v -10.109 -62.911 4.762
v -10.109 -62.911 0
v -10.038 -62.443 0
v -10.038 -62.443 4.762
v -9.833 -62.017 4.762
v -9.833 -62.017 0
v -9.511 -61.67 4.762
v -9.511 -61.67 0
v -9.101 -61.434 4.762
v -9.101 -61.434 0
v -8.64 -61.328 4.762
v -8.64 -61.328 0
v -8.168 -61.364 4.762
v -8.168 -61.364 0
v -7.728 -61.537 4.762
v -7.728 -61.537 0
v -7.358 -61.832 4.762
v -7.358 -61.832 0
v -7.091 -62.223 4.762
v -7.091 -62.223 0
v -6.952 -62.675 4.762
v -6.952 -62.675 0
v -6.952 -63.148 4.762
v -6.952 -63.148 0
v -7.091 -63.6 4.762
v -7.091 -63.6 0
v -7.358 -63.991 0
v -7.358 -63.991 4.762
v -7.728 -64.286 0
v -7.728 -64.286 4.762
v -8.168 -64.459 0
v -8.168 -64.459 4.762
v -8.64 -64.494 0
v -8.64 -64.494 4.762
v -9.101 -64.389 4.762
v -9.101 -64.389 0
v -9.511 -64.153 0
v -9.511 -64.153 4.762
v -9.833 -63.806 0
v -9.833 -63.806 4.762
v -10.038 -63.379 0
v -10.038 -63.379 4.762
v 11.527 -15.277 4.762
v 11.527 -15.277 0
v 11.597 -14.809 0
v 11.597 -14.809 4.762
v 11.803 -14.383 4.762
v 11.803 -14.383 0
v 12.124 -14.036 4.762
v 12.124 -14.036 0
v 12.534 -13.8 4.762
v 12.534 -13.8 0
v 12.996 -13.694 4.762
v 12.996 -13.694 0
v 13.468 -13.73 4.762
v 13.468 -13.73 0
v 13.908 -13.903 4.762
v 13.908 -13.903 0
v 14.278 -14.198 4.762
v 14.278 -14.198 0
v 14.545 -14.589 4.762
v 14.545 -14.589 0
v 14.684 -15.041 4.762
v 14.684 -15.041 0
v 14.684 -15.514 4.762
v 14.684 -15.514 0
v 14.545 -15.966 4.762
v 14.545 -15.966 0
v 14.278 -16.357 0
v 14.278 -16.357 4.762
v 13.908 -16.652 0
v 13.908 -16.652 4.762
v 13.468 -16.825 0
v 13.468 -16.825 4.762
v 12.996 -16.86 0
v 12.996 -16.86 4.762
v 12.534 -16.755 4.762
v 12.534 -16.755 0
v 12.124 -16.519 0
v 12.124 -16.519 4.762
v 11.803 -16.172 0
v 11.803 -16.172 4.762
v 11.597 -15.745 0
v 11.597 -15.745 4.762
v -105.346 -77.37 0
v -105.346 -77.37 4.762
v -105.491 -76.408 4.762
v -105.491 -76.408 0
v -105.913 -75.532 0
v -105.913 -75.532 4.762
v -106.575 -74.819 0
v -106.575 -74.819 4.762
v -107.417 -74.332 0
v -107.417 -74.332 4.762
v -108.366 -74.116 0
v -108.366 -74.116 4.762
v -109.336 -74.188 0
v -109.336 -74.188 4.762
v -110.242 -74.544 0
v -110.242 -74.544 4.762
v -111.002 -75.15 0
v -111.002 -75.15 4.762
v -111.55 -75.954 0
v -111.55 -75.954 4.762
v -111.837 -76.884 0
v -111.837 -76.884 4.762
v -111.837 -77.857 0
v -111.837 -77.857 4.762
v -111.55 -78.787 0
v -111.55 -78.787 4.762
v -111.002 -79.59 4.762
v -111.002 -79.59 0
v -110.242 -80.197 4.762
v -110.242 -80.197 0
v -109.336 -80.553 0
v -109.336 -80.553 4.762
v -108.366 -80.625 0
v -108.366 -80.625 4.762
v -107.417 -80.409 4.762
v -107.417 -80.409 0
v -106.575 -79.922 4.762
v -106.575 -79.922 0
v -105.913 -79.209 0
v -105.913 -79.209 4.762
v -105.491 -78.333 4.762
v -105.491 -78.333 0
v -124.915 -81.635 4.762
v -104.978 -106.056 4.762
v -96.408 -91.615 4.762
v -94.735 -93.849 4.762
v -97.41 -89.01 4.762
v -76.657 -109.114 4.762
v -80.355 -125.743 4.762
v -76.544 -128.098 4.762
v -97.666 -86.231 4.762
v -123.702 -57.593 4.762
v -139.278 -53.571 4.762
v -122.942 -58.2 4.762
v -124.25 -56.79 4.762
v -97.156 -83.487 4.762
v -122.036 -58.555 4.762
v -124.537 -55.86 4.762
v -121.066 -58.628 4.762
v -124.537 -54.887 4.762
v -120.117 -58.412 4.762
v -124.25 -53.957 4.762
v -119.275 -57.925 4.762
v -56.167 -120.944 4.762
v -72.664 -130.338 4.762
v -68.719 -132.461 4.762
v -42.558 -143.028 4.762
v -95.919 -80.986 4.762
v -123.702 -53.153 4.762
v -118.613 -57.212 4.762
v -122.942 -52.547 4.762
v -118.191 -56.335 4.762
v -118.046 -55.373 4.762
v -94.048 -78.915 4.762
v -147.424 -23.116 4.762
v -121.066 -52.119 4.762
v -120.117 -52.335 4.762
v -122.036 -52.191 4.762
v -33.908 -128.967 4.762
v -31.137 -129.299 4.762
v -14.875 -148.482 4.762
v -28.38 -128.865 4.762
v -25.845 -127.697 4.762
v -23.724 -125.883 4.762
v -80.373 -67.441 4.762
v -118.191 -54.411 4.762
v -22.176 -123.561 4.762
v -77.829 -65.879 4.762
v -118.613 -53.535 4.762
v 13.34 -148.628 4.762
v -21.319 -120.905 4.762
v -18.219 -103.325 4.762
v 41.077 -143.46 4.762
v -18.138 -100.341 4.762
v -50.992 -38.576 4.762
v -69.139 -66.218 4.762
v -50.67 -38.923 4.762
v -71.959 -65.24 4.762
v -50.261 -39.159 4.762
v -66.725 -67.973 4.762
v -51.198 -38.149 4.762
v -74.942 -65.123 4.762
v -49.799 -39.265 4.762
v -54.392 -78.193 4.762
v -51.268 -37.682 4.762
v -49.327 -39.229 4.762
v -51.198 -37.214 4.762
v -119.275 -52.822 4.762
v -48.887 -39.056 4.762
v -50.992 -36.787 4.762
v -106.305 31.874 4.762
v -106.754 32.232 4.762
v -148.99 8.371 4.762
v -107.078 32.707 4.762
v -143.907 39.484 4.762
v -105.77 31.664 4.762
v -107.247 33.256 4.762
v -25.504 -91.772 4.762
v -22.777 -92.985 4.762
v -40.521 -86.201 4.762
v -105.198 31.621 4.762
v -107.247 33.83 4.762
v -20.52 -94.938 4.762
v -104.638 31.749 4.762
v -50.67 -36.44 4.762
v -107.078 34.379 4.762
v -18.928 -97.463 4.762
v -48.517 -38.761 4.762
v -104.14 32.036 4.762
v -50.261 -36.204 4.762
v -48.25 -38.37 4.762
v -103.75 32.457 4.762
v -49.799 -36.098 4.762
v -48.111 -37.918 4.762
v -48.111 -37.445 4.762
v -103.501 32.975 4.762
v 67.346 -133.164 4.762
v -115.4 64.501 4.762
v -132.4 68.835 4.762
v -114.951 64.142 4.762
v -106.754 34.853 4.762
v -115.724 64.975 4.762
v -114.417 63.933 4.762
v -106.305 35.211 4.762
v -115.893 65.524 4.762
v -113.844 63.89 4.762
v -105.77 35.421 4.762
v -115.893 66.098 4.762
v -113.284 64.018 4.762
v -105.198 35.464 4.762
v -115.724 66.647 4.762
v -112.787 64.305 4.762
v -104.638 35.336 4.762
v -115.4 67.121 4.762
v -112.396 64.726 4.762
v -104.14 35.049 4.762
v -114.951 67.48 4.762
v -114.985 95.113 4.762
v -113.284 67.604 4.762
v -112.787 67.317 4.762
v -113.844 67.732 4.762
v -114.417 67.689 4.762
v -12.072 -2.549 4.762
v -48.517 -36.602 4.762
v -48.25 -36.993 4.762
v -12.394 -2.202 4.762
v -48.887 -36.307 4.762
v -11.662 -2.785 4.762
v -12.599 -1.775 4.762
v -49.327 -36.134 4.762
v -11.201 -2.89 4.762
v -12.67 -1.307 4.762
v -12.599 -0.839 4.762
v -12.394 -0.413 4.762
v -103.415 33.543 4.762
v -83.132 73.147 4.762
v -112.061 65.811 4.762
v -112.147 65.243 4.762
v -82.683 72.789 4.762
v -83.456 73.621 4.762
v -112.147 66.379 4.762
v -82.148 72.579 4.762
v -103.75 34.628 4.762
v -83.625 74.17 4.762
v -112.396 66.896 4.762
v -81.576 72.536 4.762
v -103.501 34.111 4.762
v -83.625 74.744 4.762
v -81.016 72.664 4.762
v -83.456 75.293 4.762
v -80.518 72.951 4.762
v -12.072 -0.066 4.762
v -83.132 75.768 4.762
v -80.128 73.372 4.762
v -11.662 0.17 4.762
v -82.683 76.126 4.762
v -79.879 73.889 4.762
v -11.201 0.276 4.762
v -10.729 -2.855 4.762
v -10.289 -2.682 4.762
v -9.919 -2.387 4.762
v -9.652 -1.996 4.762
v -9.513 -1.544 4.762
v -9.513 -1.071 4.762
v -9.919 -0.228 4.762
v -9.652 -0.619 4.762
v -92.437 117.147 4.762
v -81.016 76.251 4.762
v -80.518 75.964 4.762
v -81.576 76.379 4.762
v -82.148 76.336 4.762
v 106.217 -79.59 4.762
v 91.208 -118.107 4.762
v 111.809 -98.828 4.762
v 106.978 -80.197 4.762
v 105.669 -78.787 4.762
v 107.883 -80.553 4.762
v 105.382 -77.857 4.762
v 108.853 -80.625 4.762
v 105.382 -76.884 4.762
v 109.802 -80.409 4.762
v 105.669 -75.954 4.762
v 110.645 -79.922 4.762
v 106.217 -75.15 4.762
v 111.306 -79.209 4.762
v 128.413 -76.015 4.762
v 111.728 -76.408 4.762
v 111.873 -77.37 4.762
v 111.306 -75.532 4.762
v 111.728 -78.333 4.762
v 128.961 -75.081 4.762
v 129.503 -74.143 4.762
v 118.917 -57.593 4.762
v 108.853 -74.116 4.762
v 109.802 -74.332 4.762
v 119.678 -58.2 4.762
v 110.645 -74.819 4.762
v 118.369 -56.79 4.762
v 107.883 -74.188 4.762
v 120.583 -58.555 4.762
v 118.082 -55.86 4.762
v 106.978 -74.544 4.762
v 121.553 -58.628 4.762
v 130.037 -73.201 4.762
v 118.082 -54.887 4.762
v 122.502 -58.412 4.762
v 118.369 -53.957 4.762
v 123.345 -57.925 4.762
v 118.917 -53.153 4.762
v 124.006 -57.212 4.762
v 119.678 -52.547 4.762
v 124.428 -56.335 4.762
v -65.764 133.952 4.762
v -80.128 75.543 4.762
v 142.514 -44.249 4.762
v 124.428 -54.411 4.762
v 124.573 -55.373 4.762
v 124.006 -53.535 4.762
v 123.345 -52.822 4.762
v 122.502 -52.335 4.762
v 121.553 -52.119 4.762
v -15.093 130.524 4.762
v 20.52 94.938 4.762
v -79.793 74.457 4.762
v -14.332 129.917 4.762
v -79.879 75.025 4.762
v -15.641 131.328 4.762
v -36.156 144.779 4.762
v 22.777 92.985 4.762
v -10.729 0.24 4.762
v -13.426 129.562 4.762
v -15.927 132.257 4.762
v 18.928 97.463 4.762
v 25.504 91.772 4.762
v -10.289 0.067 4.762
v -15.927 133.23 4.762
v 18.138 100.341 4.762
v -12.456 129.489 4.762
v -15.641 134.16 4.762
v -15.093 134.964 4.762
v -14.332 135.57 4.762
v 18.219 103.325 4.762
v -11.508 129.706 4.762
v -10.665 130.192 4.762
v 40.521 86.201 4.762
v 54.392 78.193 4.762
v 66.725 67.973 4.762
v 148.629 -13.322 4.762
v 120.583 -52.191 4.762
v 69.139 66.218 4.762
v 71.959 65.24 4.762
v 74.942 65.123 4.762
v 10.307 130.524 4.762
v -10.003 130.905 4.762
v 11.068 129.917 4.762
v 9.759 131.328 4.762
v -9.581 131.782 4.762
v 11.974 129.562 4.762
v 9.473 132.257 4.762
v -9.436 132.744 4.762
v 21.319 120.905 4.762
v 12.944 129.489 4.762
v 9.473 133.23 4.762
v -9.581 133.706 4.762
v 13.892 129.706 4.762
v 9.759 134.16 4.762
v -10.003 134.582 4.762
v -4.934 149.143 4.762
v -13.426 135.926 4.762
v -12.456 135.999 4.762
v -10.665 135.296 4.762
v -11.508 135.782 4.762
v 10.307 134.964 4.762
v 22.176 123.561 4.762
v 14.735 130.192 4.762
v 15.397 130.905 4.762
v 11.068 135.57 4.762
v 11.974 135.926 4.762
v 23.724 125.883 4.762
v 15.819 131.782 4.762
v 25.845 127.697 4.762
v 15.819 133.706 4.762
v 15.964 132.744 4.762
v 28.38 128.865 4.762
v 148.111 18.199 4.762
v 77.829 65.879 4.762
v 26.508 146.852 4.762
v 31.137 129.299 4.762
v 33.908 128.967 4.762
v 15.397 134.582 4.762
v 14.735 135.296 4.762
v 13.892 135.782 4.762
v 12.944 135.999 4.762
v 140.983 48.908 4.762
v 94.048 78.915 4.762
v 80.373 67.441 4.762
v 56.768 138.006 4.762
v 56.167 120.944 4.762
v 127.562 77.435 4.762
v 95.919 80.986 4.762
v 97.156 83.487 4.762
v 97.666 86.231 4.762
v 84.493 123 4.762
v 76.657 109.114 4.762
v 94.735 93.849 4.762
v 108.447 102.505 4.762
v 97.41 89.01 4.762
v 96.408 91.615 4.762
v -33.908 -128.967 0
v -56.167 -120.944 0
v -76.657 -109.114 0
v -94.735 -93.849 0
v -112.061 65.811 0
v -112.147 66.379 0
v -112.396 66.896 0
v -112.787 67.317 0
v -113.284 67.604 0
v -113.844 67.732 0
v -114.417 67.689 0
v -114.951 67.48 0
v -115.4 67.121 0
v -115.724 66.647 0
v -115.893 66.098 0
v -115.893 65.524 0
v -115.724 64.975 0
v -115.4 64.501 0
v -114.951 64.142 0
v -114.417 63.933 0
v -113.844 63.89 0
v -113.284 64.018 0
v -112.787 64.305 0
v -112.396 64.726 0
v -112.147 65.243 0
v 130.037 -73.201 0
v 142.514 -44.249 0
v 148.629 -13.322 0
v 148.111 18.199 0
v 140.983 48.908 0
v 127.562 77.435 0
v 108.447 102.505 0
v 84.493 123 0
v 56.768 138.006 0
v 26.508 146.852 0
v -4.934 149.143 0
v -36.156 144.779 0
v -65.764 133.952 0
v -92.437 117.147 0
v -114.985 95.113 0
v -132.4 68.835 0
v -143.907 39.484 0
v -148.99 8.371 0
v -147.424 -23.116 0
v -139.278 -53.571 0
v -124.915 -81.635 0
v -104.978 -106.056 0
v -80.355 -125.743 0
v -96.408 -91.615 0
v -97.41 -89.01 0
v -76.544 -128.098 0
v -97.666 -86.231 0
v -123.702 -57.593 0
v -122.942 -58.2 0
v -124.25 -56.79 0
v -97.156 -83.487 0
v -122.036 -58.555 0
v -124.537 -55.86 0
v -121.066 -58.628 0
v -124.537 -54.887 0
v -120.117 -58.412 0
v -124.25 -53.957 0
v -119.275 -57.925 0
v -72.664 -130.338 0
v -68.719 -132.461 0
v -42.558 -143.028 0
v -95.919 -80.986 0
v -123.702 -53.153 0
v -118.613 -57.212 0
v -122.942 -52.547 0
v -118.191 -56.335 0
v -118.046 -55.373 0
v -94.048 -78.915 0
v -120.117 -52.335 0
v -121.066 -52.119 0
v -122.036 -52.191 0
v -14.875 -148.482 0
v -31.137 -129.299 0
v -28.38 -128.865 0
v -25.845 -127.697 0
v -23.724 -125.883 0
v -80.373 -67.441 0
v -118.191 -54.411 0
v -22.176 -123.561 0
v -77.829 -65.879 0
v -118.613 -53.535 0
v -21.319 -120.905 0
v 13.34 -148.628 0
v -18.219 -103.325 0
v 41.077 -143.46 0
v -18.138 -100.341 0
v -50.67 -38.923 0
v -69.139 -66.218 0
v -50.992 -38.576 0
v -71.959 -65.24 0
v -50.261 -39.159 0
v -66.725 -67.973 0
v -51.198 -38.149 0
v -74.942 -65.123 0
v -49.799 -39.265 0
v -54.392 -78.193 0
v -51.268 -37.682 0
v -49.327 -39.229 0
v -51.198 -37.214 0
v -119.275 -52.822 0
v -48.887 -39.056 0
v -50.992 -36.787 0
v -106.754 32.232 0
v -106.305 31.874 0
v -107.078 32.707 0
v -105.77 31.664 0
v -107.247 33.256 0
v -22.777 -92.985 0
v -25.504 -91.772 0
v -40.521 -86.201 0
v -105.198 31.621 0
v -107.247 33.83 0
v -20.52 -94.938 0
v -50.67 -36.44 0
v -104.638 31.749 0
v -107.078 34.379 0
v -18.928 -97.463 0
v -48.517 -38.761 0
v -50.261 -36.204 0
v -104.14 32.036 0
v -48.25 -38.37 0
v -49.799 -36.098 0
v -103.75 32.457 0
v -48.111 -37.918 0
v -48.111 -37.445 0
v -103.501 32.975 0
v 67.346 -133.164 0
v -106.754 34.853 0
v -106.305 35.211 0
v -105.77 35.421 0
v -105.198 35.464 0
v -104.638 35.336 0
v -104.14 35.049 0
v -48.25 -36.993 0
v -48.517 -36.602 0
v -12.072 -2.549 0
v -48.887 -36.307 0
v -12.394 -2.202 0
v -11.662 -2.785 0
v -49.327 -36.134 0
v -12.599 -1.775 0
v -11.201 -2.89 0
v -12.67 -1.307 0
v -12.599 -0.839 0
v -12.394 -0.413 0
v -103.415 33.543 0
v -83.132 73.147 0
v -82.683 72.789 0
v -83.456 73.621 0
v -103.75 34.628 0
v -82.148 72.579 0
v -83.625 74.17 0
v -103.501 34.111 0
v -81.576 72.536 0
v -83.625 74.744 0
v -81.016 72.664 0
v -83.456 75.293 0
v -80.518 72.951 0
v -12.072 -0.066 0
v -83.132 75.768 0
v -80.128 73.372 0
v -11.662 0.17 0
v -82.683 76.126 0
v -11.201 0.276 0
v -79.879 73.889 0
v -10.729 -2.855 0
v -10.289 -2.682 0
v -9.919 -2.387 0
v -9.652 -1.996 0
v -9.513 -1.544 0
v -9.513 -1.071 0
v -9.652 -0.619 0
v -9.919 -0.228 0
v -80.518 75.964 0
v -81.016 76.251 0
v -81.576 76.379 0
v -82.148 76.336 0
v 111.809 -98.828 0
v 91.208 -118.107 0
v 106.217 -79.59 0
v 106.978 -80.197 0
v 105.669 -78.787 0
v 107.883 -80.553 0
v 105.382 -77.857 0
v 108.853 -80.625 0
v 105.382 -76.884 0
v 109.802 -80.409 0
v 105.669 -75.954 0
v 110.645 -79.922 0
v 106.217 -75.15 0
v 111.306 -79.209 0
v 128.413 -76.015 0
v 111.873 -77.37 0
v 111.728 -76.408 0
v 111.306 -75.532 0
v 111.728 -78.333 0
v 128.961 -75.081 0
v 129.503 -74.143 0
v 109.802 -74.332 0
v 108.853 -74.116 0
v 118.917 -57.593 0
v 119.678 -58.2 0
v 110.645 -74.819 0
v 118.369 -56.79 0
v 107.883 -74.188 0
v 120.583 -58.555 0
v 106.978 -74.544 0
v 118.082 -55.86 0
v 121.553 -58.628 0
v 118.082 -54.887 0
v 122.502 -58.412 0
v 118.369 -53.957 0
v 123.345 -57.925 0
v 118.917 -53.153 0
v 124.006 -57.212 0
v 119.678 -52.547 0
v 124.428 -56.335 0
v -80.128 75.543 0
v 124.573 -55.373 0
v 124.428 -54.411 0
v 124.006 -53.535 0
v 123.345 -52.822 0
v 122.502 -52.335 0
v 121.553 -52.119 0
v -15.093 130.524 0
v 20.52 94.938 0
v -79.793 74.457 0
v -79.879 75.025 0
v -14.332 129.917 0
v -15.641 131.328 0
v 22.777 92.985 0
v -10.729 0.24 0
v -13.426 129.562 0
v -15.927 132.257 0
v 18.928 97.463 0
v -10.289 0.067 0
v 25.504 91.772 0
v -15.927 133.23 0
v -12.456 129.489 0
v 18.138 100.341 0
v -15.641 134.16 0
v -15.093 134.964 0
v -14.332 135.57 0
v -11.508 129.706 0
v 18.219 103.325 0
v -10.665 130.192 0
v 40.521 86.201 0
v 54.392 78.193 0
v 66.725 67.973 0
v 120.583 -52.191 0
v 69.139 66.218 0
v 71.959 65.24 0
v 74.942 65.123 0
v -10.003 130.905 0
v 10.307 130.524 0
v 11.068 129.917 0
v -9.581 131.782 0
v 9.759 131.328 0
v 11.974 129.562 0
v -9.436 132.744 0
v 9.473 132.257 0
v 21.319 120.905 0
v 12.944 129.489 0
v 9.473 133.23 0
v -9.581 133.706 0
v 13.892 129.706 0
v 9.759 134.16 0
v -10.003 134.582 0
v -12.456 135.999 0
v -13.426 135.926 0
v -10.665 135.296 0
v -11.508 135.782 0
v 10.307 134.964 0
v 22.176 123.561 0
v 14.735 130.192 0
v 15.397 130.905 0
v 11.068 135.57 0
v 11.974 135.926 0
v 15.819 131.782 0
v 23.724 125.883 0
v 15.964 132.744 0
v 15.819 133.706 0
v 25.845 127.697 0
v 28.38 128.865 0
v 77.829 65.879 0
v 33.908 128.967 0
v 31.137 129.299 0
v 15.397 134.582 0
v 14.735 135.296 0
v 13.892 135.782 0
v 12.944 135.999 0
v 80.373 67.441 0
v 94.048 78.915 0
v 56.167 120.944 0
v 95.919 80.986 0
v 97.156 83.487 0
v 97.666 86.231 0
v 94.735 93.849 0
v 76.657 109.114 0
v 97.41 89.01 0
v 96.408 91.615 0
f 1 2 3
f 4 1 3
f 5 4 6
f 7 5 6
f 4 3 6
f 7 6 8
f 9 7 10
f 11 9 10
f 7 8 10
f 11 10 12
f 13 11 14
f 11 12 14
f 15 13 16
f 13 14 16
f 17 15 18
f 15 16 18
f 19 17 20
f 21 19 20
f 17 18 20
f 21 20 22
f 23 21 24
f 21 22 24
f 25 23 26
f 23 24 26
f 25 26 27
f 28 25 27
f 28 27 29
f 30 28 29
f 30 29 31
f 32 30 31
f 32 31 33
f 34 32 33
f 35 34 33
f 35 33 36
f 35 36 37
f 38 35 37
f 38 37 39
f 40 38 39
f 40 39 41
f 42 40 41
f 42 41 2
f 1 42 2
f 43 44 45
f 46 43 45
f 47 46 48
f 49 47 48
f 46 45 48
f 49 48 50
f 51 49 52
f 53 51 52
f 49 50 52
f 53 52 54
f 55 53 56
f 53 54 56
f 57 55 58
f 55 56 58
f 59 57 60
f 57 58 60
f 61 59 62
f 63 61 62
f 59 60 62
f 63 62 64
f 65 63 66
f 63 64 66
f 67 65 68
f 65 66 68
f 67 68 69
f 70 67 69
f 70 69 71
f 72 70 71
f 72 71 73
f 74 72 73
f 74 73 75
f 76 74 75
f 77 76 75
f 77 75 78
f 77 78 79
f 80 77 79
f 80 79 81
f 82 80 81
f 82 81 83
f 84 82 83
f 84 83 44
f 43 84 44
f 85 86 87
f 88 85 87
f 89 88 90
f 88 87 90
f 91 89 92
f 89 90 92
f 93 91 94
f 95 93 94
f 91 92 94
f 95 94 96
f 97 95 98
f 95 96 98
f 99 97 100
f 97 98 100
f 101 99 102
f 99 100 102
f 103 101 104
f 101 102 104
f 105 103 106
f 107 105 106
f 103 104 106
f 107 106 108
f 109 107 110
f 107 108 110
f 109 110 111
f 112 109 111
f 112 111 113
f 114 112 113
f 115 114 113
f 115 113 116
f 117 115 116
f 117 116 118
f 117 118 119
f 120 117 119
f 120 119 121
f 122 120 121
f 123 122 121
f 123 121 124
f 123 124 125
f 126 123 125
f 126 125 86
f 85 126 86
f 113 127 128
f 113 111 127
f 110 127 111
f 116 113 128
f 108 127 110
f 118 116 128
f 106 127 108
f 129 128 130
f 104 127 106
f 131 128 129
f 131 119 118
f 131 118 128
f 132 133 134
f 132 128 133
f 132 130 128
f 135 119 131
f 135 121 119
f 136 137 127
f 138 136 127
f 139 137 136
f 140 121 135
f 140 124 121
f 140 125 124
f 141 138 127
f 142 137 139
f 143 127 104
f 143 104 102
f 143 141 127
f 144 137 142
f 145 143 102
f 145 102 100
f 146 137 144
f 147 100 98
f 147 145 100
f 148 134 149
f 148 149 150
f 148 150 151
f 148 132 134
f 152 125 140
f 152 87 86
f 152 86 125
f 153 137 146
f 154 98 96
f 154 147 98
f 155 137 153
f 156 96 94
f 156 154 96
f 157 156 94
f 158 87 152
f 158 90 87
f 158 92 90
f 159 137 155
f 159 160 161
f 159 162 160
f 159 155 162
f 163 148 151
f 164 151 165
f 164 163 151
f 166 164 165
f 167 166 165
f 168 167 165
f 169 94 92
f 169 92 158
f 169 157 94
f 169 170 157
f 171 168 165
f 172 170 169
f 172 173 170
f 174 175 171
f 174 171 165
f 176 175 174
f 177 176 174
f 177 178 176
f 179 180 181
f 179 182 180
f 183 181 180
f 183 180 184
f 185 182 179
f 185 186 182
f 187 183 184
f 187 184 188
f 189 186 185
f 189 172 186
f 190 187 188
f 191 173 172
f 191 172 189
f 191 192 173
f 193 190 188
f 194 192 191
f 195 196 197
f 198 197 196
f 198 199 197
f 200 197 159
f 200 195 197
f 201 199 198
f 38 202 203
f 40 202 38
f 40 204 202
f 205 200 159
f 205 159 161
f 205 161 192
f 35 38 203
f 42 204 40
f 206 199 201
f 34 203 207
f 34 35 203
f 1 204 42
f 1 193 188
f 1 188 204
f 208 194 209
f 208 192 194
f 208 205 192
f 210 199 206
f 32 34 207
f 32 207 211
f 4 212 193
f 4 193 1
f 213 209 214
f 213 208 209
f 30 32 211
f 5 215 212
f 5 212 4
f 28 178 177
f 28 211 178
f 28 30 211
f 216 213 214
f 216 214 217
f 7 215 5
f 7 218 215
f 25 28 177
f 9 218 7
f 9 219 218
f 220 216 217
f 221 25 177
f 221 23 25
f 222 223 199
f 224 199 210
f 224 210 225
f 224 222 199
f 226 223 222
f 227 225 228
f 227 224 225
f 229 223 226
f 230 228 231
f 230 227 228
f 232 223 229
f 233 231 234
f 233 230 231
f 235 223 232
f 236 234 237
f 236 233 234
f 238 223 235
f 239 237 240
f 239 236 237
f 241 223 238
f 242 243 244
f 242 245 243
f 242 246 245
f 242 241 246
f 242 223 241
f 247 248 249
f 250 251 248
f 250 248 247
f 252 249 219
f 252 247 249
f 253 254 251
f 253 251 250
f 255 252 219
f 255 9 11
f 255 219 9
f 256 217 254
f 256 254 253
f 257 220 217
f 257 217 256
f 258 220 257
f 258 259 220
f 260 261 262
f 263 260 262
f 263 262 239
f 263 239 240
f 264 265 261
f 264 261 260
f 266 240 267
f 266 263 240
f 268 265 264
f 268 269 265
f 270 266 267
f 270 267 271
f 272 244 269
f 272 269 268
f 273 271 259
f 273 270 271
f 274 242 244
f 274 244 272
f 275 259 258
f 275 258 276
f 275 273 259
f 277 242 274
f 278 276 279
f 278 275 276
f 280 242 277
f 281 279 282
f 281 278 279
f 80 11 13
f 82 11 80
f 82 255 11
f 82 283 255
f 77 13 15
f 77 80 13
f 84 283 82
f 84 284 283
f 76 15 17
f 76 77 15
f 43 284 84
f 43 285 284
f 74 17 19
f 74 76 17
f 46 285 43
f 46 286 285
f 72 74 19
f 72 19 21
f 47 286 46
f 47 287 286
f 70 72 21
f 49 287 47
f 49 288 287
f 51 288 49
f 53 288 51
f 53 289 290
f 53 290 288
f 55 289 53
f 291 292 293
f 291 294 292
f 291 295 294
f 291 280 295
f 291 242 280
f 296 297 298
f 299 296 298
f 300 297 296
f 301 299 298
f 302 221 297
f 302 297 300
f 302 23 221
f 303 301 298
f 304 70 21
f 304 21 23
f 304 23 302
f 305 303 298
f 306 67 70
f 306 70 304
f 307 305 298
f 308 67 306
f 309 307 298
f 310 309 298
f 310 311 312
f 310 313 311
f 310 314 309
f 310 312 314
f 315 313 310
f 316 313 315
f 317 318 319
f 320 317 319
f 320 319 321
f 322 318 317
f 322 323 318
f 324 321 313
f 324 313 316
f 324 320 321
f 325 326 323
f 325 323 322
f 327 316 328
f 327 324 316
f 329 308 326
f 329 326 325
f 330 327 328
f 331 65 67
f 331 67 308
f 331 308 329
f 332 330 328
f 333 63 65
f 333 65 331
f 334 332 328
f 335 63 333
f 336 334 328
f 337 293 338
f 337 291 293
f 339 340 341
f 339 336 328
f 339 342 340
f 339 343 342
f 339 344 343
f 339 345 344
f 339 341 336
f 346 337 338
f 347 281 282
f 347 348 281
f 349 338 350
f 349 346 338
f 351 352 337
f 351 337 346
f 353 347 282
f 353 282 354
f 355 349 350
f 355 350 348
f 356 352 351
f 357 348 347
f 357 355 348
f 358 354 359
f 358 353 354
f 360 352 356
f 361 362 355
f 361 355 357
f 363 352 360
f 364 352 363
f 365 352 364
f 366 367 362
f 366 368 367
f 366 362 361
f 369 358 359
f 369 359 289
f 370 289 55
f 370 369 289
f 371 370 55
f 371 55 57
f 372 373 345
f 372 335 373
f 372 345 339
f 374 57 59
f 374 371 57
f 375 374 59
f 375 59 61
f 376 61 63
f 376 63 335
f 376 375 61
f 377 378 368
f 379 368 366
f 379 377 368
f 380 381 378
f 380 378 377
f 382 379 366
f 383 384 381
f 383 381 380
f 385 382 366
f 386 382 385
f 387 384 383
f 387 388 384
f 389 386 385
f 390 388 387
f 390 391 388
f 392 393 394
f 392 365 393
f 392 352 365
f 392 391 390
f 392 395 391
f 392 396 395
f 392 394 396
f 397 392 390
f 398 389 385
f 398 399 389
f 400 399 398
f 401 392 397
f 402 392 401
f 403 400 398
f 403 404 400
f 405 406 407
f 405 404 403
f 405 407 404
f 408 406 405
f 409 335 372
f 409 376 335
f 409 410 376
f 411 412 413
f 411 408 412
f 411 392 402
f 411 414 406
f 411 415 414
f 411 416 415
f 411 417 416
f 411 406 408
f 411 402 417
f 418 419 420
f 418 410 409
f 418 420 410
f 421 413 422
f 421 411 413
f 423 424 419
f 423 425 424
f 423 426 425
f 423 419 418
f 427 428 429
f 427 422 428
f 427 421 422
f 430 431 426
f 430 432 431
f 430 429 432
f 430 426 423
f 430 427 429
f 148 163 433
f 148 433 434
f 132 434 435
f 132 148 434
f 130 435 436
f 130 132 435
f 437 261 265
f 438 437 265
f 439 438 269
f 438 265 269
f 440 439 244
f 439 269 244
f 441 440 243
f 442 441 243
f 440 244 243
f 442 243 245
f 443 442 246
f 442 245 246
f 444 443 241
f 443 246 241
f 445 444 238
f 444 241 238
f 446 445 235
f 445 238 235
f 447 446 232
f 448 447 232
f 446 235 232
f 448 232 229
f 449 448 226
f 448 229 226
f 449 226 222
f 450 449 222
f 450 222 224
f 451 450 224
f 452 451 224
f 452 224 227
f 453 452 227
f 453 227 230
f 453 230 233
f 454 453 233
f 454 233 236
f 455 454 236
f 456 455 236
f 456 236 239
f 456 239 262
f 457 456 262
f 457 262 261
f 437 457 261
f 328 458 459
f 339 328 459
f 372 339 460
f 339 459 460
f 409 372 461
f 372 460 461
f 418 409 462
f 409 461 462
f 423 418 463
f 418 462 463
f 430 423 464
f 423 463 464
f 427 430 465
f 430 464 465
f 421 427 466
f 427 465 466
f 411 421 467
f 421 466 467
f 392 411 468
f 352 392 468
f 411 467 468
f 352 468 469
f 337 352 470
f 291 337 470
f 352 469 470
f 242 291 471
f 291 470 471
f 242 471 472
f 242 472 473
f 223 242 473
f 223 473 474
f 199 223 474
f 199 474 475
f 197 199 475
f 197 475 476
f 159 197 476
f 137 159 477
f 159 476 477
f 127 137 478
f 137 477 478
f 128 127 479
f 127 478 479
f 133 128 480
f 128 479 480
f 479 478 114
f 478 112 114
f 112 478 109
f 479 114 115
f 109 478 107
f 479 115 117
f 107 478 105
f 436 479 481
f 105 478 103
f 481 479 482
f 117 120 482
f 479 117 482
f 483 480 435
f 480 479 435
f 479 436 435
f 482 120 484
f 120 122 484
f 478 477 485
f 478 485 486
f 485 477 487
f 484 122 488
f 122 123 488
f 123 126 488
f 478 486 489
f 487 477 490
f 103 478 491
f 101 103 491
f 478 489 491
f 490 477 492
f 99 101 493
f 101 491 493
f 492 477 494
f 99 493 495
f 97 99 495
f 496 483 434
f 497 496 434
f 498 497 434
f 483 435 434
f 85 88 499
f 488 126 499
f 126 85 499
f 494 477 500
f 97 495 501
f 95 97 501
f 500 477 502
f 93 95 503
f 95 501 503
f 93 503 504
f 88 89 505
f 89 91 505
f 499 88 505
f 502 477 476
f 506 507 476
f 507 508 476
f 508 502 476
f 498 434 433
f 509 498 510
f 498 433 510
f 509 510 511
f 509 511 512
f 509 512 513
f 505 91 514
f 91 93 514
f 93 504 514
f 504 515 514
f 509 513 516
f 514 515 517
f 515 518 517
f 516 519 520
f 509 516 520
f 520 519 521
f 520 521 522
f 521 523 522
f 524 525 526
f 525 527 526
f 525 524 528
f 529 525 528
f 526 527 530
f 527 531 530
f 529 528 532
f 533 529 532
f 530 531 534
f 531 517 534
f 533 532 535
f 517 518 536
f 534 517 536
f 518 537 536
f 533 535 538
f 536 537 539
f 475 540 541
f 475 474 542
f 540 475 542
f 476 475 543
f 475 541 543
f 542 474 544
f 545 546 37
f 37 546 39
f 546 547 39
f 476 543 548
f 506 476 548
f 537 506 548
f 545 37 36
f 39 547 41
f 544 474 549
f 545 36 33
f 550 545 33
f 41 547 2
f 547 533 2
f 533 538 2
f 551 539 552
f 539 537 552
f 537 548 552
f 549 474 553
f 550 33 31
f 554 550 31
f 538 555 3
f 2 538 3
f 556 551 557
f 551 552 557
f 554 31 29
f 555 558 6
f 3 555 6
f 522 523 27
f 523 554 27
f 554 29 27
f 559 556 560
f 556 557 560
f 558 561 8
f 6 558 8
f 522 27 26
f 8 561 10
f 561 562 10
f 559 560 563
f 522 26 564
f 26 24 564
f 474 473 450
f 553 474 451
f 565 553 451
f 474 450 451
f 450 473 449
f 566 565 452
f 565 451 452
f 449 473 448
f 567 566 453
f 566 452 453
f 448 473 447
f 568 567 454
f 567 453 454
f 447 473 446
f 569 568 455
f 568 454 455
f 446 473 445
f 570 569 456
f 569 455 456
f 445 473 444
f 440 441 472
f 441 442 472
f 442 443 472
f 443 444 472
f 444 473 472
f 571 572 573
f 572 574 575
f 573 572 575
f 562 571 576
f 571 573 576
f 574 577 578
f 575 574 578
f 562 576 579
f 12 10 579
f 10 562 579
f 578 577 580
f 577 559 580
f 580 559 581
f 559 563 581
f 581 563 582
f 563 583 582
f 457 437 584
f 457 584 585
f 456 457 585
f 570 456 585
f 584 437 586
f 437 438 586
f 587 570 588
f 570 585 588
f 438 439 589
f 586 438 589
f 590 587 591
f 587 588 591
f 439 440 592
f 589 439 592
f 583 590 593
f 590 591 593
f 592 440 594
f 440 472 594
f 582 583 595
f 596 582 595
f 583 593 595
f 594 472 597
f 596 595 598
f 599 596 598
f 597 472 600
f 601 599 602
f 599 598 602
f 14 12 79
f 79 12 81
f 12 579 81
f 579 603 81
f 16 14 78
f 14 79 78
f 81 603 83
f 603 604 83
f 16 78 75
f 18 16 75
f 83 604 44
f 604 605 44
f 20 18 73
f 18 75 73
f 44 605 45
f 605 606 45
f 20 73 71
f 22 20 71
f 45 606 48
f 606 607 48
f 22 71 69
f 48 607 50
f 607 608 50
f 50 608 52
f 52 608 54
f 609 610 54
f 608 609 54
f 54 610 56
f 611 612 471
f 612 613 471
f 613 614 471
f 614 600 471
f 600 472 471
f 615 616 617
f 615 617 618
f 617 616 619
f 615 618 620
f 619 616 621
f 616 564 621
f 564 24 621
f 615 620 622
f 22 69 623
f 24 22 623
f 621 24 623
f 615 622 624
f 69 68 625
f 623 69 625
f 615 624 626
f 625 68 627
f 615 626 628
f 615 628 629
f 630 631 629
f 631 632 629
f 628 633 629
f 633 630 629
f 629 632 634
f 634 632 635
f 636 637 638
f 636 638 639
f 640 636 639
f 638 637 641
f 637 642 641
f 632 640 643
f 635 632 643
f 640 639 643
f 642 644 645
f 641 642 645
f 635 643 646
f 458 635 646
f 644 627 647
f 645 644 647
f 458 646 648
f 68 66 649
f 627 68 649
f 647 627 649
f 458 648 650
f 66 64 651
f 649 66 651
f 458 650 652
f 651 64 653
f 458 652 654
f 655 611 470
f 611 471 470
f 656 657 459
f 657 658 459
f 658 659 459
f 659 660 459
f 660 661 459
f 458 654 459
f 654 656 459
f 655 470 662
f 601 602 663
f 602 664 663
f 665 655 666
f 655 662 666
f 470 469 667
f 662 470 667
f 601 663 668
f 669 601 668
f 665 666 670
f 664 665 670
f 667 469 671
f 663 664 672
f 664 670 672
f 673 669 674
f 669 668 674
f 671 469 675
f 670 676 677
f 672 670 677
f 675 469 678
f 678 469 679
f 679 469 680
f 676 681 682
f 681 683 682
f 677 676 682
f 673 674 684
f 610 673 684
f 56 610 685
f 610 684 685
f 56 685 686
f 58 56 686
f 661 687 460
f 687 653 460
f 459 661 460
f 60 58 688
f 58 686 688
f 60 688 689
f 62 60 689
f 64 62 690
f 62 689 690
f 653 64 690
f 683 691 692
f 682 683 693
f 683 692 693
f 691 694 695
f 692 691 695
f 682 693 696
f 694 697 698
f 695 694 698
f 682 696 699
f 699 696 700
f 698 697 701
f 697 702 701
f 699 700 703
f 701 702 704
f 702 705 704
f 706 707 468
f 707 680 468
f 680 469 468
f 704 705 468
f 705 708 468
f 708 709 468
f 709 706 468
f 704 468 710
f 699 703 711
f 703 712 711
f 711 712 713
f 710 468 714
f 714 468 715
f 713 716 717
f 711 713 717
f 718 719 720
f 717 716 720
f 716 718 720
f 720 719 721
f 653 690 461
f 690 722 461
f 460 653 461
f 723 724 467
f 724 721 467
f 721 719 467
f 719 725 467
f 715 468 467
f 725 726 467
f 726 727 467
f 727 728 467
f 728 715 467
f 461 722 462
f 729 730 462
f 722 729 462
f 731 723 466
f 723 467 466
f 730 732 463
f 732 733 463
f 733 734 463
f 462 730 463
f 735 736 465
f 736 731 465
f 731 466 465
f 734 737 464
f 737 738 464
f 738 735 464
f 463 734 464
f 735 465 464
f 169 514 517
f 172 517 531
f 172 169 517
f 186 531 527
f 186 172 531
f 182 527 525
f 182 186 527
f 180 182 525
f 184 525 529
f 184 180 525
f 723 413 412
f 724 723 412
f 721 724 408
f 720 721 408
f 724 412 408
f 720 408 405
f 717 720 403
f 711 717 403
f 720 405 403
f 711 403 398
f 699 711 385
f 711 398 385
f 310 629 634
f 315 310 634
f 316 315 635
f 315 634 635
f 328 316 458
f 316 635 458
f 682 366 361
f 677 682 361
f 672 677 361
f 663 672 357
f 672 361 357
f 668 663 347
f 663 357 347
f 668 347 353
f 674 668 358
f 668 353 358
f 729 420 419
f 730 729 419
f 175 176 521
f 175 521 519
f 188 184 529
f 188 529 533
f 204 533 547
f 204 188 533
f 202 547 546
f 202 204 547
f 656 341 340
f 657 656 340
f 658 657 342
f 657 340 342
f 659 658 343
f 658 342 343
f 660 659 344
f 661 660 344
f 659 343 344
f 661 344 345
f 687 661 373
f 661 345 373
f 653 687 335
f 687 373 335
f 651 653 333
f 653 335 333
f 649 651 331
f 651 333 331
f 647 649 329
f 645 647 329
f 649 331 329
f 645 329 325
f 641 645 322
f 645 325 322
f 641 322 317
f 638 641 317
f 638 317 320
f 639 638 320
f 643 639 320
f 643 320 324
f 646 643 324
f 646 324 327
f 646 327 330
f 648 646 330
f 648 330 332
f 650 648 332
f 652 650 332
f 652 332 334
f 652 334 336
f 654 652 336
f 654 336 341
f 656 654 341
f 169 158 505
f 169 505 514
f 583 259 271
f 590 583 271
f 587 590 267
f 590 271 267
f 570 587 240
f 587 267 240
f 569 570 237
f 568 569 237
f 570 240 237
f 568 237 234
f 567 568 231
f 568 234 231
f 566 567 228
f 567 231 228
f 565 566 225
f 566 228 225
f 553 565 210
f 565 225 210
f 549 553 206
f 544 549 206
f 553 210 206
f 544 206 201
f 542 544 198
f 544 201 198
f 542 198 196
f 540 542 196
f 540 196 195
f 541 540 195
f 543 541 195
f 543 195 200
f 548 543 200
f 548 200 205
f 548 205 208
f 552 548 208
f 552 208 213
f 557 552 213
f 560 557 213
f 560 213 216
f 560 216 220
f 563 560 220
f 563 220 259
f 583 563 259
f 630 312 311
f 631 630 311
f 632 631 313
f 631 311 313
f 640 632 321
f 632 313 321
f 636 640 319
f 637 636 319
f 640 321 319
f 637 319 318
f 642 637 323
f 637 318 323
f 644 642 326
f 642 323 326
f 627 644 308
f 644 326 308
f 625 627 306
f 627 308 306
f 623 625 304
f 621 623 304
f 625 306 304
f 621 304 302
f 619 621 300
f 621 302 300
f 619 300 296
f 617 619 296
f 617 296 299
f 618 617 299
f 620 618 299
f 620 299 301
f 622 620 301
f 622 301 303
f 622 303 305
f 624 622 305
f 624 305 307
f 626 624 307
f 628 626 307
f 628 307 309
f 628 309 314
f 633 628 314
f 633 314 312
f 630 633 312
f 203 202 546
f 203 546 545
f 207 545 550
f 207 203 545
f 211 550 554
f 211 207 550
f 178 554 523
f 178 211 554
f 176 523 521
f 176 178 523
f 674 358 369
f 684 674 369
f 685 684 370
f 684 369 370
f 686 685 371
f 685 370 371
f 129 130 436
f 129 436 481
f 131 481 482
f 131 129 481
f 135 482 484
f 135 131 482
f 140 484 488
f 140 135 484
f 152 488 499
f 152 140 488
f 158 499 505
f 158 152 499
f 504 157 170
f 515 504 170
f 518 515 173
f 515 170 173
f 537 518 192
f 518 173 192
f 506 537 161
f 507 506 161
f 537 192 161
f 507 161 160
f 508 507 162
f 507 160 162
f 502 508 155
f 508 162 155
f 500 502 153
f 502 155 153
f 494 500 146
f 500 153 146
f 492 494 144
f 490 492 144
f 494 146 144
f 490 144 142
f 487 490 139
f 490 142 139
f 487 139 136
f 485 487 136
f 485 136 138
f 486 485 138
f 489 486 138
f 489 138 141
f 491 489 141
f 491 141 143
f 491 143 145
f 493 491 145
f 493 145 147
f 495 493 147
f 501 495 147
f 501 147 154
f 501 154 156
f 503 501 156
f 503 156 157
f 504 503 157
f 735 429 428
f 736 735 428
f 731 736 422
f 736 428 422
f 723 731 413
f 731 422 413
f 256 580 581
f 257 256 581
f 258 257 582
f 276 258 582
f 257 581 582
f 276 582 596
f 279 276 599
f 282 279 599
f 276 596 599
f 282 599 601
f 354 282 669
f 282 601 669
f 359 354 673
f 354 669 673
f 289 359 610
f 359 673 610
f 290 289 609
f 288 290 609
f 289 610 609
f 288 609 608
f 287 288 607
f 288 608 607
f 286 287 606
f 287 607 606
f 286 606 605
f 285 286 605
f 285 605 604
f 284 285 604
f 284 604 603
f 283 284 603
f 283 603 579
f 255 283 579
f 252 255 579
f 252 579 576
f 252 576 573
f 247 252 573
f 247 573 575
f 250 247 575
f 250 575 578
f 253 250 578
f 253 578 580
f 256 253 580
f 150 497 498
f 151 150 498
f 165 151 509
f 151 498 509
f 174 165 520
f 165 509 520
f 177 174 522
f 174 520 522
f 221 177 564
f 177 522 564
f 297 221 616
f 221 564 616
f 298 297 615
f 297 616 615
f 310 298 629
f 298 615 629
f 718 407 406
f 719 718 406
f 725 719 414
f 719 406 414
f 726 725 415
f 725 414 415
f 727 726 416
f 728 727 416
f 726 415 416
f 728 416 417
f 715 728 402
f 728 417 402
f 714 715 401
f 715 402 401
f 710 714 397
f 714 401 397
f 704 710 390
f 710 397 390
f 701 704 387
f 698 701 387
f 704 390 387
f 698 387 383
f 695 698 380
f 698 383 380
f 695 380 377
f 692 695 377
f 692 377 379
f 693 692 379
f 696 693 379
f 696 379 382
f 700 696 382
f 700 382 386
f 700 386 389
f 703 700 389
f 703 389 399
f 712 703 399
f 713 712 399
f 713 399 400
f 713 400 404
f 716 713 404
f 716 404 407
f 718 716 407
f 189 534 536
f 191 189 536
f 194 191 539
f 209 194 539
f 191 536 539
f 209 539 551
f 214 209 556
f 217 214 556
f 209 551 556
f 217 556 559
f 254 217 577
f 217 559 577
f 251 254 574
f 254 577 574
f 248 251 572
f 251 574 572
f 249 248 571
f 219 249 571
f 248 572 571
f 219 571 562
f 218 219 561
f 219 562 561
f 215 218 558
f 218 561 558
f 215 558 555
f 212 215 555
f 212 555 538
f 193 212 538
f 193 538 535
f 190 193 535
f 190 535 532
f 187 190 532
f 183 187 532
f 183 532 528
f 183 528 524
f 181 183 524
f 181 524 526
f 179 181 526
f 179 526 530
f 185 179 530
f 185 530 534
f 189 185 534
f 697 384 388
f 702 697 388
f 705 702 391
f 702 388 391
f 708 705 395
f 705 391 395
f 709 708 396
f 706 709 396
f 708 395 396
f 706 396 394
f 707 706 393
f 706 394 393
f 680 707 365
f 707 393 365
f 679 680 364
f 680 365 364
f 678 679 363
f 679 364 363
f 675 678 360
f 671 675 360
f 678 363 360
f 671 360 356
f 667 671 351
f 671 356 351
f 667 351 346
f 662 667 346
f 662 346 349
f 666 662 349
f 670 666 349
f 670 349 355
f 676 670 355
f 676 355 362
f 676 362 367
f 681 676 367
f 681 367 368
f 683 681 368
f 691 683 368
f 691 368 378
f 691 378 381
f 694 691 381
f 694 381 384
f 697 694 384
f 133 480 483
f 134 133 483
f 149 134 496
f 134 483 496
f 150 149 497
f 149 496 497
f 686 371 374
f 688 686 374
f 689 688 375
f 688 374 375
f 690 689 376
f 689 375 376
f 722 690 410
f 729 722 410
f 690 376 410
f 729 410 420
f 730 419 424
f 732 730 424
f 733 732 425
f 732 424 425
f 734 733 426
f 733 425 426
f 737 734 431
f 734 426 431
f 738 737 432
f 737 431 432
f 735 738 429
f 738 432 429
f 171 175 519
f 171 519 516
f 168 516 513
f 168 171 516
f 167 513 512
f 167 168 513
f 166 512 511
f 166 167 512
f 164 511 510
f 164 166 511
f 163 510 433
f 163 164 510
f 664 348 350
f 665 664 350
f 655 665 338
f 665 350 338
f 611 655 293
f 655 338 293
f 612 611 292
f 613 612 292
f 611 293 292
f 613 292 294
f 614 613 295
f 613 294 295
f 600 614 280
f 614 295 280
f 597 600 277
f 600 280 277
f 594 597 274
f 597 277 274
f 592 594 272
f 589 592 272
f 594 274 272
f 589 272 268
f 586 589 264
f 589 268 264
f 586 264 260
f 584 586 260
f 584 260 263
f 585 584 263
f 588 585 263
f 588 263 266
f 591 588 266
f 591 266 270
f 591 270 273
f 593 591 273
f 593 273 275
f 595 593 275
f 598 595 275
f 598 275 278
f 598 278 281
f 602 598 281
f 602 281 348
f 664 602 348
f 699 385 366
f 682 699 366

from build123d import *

# Parameters (mm, degrees)
BOSS_EXTRUDE1_DEPTH          = 4.762
SKETCH5_R                    = 1.926649595
MOTOR_MOUNTING_HOLES_DEPTH   = 5.762
SKETCH7_R                    = 1.5875
ARDUINO_MOUNTING_HOLES_DEPTH = 5.762
SKETCH9_R                    = 3.2639
F_1_4_20_FEET_HOLES_DEPTH    = 5.762
HANDLES_DEPTH                = 5.762


with BuildPart() as part:
    # Sketch1 → Boss-Extrude1 (new body)
    with BuildSketch(Plane.XY):
        with BuildLine():
            ThreePointArc((-80.354757502, -125.742648182), (-74.6125, -129.23264088), (-68.718948913, -132.460585403))
            ThreePointArc((-68.718948913, -132.460585403), (41.077351206, -143.459931141), (128.412526716, -76.015285354))
            ThreePointArc((128.412526716, -76.015285354), (129.23264088, -74.6125), (130.03743155, -73.200867623))
            ThreePointArc((130.03743155, -73.200867623), (-36.155935906, 144.778620396), (-80.354757502, -125.742648182))
        make_face()
    extrude(amount=BOSS_EXTRUDE1_DEPTH)

    # Sketch5 → motor_mounting_holes (cut, through all)
    with BuildSketch(Plane.XY.offset(4.762)):
        with Locations((-81.719743632, 74.457252102)):
            Circle(SKETCH5_R)
        with Locations((-113.98799572, 65.811000014)):
            Circle(SKETCH5_R)
        with Locations((-105.341743632, 33.542747925)):
            Circle(SKETCH5_R)
    extrude(amount=-MOTOR_MOUNTING_HOLES_DEPTH, mode=Mode.SUBTRACT)

    # Sketch7 → arduino mounting holes (cut, through all)
    with BuildSketch(Plane(origin=(0, 0, 0), x_dir=(-1, 0, 0), z_dir=(0, 0, -1))):
        with Locations((-13.114276913, -15.277418882)):
            Circle(SKETCH7_R)
        with Locations((8.521314036, -62.911361657)):
            Circle(SKETCH7_R)
        with Locations((11.082472869, -1.307418882)):
            Circle(SKETCH7_R)
        with Locations((49.680700023, -37.681509395)):
            Circle(SKETCH7_R)
    extrude(amount=-ARDUINO_MOUNTING_HOLES_DEPTH, mode=Mode.SUBTRACT)

    # Sketch9 → 1/4-20 feet holes (cut, through all)
    with BuildSketch(Plane.XY.offset(4.762)):
        with Locations((121.309555388, -55.373407621)):
            Circle(SKETCH9_R)
        with Locations((108.609555388, -77.370452877)):
            Circle(SKETCH9_R)
        with Locations((-108.609555388, -77.370452877)):
            Circle(SKETCH9_R)
        with Locations((-121.309555388, -55.373407621)):
            Circle(SKETCH9_R)
        with Locations((-12.7, 132.743860498)):
            Circle(SKETCH9_R)
        with Locations((12.7, 132.743860498)):
            Circle(SKETCH9_R)
    extrude(amount=-F_1_4_20_FEET_HOLES_DEPTH, mode=Mode.SUBTRACT)

    # Sketch8 → handles (cut, through all)
    with BuildSketch(Plane.XY.offset(4.762)):
        with BuildLine():
            Line((21.318841652, 120.905159074), (18.219031169, 103.325260238))
            ThreePointArc((18.219031169, 103.325260238), (19.630613539, 96.141801354), (25.504227054, 91.771983211))
            ThreePointArc((25.504227054, 91.771983211), (47.625, 82.48891971), (66.724755289, 67.973300138))
            ThreePointArc((66.724755289, 67.973300138), (73.445935569, 65.071510694), (80.372784634, 67.440773943))
            Line((80.372784634, 67.440773943), (94.047518381, 78.915237986))
            ThreePointArc((94.047518381, 78.915237986), (97.666057076, 86.231232388), (94.734676371, 93.848620624))
            ThreePointArc((94.734676371, 93.848620624), (66.675, 115.484487595), (33.907951385, 128.966946668))
            ThreePointArc((33.907951385, 128.966946668), (25.845409309, 127.696902709), (21.318841652, 120.905159074))
        make_face()
        with BuildLine():
            Line((-94.047518381, -78.915237986), (-80.372784634, -67.440773943))
            ThreePointArc((-80.372784634, -67.440773943), (-73.445935569, -65.071510694), (-66.724755289, -67.973300138))
            ThreePointArc((-66.724755289, -67.973300138), (-47.625, -82.48891971), (-25.504227054, -91.771983211))
            ThreePointArc((-25.504227054, -91.771983211), (-19.630613539, -96.141801354), (-18.219031169, -103.325260238))
            Line((-18.219031169, -103.325260238), (-21.318841652, -120.905159074))
            ThreePointArc((-21.318841652, -120.905159074), (-25.845409309, -127.696902709), (-33.907951385, -128.966946668))
            ThreePointArc((-33.907951385, -128.966946668), (-66.675, -115.484487595), (-94.734676371, -93.848620624))
            ThreePointArc((-94.734676371, -93.848620624), (-97.666057076, -86.231232388), (-94.047518381, -78.915237986))
        make_face()
    extrude(amount=-HANDLES_DEPTH, mode=Mode.SUBTRACT)


solid = part.part
